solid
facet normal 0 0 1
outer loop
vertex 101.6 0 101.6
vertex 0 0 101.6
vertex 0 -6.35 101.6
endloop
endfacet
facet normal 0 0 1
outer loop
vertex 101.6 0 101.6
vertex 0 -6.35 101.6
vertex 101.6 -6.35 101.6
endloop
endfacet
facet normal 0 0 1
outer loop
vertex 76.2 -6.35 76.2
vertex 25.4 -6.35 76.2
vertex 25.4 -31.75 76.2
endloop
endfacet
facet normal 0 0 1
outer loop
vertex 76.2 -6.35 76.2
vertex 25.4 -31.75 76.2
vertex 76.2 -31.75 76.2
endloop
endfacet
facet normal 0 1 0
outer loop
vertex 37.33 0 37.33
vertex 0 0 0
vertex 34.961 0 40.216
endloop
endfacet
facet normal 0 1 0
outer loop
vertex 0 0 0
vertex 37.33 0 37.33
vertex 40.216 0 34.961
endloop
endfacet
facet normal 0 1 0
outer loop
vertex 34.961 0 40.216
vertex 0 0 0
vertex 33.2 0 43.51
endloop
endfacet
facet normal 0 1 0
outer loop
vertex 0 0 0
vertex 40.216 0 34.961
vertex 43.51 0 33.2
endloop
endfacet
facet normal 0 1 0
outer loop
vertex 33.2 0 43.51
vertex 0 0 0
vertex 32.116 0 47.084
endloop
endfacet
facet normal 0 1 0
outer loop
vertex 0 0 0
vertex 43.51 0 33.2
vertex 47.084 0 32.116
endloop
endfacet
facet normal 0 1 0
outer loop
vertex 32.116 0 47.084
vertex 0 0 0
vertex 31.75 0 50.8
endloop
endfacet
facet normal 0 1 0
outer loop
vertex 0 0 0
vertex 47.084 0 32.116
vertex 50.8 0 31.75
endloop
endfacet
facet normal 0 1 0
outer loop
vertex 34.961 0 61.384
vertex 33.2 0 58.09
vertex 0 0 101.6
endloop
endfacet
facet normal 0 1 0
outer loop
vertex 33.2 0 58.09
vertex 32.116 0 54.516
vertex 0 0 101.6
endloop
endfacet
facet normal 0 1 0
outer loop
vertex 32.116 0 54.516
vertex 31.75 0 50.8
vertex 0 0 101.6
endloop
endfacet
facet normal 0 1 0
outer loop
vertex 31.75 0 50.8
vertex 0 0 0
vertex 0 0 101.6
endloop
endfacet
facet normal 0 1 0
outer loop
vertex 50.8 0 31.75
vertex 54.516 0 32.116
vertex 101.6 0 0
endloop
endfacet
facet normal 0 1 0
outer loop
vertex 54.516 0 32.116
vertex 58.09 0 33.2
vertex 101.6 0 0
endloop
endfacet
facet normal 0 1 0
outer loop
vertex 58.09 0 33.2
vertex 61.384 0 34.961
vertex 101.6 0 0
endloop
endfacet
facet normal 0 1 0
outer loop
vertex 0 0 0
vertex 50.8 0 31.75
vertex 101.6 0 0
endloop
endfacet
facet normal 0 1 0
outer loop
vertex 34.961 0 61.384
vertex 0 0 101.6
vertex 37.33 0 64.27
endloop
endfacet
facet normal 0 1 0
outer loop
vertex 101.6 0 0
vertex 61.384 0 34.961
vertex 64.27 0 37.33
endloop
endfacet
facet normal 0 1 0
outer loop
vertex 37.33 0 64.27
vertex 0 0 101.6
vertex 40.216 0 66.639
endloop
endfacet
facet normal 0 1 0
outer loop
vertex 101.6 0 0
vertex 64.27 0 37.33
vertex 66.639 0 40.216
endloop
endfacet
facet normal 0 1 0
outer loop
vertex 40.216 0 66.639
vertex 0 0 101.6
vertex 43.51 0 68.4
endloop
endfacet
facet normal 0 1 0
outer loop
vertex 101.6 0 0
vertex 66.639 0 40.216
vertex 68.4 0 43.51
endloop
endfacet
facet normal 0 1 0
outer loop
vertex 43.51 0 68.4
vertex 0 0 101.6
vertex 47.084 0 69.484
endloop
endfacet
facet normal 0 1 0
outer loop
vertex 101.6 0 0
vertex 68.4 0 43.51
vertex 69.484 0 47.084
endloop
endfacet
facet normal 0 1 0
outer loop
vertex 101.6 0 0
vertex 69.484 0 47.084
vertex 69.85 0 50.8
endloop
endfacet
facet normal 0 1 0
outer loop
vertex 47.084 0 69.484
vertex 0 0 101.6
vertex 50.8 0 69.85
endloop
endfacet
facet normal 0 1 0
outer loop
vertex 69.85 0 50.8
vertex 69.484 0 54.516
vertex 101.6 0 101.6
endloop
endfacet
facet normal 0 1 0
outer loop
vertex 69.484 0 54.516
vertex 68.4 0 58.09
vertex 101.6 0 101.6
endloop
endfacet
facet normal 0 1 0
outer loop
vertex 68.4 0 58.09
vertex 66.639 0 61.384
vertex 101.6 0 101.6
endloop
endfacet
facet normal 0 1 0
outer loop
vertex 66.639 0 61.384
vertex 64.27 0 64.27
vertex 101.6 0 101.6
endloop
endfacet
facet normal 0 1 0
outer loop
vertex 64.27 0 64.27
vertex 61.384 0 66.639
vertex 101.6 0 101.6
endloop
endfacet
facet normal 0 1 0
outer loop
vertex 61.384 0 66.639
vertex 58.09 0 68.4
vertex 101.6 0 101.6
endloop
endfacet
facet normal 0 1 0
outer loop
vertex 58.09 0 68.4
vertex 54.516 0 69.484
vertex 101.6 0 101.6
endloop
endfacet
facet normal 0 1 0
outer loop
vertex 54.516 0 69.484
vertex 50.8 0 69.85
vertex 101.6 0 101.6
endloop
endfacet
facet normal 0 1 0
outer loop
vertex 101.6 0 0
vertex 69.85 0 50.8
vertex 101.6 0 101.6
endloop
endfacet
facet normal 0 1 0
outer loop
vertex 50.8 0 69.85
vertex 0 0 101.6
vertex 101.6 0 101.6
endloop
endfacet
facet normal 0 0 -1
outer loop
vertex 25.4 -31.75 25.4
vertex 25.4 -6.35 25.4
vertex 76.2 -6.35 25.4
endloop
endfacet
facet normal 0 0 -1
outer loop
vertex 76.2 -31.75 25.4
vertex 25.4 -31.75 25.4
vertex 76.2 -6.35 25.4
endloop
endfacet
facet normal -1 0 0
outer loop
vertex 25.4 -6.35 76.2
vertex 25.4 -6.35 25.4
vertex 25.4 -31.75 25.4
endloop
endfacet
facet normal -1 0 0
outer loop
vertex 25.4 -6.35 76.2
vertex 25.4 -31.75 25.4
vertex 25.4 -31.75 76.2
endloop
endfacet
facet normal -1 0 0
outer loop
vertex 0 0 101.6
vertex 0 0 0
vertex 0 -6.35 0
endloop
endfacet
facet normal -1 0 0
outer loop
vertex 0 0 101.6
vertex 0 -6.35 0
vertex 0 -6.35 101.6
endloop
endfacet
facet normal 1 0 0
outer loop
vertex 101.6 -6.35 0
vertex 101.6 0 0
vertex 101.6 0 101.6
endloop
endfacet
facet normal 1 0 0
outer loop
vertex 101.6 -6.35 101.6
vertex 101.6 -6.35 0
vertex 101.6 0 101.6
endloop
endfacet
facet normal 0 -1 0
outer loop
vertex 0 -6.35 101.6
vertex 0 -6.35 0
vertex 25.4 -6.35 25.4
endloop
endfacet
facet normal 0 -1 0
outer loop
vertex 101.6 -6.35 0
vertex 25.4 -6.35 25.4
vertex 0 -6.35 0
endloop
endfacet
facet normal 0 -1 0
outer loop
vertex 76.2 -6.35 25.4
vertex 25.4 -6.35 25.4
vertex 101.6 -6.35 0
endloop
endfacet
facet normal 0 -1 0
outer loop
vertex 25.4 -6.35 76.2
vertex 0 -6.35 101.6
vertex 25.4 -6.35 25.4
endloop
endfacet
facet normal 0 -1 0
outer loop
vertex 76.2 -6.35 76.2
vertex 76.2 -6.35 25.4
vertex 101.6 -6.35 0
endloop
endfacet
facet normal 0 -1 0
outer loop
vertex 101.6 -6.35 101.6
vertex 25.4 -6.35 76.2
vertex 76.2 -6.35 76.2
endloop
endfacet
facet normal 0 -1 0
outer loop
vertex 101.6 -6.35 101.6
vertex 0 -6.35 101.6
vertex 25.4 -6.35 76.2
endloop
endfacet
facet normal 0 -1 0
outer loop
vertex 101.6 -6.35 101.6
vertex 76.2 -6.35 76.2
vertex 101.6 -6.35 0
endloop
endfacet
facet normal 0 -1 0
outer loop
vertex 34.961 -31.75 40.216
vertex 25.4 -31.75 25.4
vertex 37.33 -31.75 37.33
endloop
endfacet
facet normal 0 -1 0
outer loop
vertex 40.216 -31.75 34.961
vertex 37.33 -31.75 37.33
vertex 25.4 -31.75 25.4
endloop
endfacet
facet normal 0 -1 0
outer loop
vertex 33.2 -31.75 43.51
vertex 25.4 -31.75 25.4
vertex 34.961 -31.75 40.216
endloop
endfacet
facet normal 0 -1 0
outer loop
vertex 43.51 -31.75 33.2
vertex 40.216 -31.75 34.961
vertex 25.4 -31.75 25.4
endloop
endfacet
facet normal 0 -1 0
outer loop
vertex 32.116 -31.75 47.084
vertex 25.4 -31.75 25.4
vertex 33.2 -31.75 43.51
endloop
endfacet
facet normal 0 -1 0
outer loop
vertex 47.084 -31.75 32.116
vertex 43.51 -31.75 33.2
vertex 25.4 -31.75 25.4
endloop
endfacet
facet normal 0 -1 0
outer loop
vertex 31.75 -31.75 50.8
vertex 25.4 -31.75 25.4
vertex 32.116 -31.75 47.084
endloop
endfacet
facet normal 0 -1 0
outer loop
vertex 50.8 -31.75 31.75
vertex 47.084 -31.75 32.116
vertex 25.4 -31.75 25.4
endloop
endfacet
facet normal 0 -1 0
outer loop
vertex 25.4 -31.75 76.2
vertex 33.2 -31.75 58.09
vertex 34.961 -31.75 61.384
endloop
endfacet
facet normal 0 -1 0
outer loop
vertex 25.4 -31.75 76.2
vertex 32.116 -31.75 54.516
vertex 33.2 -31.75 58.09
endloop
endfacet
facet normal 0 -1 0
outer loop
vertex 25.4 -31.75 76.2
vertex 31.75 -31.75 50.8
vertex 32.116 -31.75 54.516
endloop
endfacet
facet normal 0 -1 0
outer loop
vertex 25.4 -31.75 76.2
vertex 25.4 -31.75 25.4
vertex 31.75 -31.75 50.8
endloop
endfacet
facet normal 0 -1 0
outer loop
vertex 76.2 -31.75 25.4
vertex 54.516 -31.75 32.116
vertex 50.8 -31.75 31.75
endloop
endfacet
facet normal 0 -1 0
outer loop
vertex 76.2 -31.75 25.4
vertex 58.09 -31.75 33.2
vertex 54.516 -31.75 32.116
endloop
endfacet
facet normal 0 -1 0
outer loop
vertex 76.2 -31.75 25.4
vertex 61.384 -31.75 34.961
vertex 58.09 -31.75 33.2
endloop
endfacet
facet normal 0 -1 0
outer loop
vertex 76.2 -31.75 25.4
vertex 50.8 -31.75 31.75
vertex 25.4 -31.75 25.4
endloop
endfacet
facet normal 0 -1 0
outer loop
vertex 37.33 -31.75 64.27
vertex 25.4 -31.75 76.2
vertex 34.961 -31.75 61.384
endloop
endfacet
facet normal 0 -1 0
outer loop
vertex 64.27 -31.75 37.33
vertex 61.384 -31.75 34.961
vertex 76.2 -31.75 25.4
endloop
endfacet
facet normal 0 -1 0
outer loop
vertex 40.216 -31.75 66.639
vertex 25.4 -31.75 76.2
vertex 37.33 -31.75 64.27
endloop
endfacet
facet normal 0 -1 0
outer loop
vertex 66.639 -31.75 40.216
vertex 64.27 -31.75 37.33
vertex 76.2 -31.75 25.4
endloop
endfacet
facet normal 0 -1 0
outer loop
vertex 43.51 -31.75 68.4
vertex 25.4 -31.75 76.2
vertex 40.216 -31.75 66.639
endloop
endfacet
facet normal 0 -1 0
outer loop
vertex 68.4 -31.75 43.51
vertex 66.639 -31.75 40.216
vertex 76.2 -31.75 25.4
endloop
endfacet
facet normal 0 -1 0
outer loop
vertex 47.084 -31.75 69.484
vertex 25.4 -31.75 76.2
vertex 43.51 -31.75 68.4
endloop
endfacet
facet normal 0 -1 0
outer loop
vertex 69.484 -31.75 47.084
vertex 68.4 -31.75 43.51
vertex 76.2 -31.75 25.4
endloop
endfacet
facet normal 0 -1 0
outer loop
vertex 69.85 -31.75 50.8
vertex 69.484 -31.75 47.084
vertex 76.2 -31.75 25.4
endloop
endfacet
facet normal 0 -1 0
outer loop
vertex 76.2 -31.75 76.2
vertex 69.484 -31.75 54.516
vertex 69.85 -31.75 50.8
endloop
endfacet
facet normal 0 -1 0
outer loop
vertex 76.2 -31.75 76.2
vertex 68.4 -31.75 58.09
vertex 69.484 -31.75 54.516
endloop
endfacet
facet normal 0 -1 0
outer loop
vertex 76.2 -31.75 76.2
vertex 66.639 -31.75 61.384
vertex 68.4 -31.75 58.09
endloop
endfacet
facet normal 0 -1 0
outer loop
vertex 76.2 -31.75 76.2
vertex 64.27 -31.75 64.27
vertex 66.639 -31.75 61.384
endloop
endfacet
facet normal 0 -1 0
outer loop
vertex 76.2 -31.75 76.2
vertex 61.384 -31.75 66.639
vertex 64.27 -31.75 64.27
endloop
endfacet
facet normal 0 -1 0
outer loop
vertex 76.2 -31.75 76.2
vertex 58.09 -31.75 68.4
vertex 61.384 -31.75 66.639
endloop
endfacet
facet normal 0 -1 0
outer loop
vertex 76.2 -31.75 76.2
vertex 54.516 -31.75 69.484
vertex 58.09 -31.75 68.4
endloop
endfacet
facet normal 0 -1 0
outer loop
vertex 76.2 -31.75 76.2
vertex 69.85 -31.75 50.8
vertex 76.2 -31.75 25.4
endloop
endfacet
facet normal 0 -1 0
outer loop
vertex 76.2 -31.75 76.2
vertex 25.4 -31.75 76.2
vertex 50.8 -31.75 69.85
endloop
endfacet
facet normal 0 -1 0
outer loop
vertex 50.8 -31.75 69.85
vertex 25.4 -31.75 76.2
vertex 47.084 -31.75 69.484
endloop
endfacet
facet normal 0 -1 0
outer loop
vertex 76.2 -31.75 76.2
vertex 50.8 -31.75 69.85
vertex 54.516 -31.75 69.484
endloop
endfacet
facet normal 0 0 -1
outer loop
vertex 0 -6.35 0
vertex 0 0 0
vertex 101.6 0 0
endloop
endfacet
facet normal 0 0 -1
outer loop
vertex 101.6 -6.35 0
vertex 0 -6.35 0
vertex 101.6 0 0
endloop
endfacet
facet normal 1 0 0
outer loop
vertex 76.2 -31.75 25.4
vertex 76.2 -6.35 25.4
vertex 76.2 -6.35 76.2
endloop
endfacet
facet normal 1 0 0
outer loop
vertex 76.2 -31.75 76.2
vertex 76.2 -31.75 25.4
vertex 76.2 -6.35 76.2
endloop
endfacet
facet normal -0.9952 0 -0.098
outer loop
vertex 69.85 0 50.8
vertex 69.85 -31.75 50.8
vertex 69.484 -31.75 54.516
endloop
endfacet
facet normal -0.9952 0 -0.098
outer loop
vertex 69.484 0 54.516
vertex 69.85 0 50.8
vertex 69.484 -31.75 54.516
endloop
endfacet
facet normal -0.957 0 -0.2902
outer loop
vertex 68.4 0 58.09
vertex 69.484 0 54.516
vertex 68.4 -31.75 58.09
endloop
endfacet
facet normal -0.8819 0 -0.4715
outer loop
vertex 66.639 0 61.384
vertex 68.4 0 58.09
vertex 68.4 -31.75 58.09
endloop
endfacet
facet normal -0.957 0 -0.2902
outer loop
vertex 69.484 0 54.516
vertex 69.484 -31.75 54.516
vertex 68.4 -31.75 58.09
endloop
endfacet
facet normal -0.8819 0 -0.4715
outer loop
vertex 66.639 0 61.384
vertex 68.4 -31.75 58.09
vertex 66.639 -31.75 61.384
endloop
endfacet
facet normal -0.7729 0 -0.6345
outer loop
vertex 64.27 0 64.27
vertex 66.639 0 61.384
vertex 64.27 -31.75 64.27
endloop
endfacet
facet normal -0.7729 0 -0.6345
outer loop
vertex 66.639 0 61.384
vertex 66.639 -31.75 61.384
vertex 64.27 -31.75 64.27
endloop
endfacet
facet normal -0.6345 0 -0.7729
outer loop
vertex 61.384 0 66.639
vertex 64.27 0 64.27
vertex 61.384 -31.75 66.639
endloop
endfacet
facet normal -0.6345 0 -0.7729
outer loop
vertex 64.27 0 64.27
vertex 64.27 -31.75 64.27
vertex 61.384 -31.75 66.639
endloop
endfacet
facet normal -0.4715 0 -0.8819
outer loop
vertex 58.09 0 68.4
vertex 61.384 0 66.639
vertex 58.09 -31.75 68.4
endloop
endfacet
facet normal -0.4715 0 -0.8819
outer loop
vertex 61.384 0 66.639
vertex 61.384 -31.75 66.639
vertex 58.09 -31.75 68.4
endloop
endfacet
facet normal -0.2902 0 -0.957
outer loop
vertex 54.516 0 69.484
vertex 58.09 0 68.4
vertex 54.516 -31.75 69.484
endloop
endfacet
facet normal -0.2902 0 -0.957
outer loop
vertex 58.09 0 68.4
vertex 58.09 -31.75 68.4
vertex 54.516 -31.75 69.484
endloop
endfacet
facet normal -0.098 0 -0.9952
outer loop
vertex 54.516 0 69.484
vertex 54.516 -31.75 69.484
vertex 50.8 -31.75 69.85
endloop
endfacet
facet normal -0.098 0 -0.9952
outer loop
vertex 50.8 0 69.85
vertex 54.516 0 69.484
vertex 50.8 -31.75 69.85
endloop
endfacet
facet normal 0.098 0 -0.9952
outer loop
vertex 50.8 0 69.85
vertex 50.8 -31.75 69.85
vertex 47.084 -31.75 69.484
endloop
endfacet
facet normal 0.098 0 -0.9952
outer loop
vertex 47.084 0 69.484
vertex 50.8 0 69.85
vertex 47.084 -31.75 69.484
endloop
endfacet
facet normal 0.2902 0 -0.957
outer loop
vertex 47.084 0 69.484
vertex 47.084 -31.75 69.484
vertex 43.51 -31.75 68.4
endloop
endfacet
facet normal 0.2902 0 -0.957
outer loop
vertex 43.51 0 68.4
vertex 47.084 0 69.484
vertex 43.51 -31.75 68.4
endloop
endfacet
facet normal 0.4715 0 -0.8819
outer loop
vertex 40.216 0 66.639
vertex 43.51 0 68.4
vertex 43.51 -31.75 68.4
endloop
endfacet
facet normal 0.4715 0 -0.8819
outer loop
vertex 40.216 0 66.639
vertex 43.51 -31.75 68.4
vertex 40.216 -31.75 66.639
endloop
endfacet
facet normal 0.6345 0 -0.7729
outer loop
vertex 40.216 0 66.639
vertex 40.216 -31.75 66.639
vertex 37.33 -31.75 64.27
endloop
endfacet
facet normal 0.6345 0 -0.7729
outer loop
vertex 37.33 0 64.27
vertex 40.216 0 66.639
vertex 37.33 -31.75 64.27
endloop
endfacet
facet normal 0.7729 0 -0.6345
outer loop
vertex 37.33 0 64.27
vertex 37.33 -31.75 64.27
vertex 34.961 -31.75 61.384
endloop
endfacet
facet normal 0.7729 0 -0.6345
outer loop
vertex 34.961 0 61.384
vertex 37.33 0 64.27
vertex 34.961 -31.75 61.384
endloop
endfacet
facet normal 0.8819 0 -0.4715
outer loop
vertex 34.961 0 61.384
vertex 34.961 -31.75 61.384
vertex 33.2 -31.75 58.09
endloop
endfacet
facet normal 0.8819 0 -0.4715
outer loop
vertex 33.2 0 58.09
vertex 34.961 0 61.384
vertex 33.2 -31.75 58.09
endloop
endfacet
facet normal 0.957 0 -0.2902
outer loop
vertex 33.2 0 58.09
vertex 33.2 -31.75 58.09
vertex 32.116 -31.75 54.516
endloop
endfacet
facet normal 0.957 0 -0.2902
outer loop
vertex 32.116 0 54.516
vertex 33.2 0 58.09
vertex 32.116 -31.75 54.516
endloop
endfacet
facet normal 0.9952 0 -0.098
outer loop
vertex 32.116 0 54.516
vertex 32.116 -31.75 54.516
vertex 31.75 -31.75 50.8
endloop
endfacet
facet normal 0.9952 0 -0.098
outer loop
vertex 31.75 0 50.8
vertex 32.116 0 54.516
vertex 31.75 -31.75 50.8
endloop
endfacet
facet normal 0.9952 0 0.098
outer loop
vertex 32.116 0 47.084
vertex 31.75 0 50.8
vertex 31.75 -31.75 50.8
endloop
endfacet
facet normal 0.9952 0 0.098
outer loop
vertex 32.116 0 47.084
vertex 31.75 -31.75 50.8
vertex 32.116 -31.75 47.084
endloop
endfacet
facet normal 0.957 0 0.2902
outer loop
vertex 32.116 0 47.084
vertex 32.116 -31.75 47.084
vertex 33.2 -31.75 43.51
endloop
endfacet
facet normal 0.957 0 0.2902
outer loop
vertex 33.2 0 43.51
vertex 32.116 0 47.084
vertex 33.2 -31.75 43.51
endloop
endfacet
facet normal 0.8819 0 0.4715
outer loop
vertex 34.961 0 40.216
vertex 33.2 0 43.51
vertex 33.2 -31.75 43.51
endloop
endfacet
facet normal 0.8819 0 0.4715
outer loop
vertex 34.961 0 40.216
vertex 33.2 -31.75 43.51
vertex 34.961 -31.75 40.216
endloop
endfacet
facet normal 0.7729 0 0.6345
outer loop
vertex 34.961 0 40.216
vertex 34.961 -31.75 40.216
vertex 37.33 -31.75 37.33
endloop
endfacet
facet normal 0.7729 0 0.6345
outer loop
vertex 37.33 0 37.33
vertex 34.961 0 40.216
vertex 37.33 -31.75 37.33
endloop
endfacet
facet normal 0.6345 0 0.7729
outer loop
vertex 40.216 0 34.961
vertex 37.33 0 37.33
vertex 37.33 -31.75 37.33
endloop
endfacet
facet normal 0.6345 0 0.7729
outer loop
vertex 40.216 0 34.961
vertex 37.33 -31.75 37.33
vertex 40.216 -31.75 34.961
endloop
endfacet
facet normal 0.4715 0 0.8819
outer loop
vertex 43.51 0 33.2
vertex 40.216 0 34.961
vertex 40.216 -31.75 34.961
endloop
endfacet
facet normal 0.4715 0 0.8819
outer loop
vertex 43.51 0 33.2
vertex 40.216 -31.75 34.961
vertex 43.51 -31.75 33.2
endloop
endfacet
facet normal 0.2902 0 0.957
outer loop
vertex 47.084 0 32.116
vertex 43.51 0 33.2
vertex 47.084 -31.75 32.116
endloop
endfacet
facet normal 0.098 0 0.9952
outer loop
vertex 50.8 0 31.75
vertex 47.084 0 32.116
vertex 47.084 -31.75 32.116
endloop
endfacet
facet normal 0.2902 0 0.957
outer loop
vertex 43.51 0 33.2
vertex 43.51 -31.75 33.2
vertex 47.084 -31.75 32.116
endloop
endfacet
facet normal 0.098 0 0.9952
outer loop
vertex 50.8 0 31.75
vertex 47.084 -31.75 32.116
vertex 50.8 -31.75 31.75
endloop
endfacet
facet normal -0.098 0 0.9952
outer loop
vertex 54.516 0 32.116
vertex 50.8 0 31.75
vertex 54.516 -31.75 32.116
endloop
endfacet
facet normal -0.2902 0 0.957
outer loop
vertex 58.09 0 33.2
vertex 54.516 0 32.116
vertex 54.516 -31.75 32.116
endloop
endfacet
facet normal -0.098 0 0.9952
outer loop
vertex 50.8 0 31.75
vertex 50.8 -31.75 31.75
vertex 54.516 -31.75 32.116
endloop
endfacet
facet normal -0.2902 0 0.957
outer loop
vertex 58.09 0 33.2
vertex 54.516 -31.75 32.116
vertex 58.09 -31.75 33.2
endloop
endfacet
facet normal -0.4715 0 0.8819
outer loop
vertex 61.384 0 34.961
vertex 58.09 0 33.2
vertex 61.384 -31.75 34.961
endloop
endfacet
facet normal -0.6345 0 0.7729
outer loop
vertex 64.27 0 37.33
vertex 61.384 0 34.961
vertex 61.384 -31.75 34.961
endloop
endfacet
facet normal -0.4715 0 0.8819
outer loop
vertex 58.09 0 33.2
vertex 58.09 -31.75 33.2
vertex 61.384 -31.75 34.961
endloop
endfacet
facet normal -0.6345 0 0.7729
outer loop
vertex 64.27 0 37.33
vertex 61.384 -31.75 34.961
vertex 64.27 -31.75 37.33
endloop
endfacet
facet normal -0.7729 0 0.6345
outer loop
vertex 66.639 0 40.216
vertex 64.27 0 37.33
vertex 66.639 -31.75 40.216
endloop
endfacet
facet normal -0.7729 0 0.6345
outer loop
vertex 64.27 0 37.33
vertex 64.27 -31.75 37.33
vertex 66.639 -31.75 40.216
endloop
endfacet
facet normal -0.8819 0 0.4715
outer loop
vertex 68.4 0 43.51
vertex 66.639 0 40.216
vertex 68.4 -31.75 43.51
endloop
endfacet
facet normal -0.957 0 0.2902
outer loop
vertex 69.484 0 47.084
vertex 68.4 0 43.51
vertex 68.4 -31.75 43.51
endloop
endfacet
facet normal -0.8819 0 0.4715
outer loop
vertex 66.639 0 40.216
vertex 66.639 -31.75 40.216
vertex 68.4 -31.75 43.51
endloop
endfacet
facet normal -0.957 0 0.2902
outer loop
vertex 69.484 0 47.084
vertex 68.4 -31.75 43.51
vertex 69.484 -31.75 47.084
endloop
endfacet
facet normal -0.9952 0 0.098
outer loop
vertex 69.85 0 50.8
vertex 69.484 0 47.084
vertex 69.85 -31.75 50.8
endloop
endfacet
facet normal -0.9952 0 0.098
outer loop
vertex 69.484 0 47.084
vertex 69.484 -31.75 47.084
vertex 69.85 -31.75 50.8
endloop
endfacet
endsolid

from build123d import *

# Parameters (mm, degrees)
F0_W     = 101.6
F0_H     = 101.6
F1_DEPTH = 6.35
F2_W     = 50.8
F2_H     = 50.8
F3_DEPTH = 25.4
F4_R     = 19.05
F5_DEPTH = 31.751


with BuildPart() as f1:
    # F0 (on Front) → F1 (new body)
    with BuildSketch(Plane.XZ):
        with Locations((50.8, 50.8)):
            Rectangle(F0_W, F0_H)
    extrude(amount=F1_DEPTH)

    # F2 (on face) → F3 (join)
    with BuildSketch(Plane.XZ.offset(6.35)):
        with Locations((50.8, 50.8)):
            Rectangle(F2_W, F2_H)
    extrude(amount=F3_DEPTH)

    # F4 (on face) → F5 (cut, through all)
    with BuildSketch(Plane.XZ.offset(31.75)):
        with Locations((50.8, 50.8)):
            Circle(F4_R)
    extrude(amount=-F5_DEPTH, mode=Mode.SUBTRACT)


solid = f1.part
